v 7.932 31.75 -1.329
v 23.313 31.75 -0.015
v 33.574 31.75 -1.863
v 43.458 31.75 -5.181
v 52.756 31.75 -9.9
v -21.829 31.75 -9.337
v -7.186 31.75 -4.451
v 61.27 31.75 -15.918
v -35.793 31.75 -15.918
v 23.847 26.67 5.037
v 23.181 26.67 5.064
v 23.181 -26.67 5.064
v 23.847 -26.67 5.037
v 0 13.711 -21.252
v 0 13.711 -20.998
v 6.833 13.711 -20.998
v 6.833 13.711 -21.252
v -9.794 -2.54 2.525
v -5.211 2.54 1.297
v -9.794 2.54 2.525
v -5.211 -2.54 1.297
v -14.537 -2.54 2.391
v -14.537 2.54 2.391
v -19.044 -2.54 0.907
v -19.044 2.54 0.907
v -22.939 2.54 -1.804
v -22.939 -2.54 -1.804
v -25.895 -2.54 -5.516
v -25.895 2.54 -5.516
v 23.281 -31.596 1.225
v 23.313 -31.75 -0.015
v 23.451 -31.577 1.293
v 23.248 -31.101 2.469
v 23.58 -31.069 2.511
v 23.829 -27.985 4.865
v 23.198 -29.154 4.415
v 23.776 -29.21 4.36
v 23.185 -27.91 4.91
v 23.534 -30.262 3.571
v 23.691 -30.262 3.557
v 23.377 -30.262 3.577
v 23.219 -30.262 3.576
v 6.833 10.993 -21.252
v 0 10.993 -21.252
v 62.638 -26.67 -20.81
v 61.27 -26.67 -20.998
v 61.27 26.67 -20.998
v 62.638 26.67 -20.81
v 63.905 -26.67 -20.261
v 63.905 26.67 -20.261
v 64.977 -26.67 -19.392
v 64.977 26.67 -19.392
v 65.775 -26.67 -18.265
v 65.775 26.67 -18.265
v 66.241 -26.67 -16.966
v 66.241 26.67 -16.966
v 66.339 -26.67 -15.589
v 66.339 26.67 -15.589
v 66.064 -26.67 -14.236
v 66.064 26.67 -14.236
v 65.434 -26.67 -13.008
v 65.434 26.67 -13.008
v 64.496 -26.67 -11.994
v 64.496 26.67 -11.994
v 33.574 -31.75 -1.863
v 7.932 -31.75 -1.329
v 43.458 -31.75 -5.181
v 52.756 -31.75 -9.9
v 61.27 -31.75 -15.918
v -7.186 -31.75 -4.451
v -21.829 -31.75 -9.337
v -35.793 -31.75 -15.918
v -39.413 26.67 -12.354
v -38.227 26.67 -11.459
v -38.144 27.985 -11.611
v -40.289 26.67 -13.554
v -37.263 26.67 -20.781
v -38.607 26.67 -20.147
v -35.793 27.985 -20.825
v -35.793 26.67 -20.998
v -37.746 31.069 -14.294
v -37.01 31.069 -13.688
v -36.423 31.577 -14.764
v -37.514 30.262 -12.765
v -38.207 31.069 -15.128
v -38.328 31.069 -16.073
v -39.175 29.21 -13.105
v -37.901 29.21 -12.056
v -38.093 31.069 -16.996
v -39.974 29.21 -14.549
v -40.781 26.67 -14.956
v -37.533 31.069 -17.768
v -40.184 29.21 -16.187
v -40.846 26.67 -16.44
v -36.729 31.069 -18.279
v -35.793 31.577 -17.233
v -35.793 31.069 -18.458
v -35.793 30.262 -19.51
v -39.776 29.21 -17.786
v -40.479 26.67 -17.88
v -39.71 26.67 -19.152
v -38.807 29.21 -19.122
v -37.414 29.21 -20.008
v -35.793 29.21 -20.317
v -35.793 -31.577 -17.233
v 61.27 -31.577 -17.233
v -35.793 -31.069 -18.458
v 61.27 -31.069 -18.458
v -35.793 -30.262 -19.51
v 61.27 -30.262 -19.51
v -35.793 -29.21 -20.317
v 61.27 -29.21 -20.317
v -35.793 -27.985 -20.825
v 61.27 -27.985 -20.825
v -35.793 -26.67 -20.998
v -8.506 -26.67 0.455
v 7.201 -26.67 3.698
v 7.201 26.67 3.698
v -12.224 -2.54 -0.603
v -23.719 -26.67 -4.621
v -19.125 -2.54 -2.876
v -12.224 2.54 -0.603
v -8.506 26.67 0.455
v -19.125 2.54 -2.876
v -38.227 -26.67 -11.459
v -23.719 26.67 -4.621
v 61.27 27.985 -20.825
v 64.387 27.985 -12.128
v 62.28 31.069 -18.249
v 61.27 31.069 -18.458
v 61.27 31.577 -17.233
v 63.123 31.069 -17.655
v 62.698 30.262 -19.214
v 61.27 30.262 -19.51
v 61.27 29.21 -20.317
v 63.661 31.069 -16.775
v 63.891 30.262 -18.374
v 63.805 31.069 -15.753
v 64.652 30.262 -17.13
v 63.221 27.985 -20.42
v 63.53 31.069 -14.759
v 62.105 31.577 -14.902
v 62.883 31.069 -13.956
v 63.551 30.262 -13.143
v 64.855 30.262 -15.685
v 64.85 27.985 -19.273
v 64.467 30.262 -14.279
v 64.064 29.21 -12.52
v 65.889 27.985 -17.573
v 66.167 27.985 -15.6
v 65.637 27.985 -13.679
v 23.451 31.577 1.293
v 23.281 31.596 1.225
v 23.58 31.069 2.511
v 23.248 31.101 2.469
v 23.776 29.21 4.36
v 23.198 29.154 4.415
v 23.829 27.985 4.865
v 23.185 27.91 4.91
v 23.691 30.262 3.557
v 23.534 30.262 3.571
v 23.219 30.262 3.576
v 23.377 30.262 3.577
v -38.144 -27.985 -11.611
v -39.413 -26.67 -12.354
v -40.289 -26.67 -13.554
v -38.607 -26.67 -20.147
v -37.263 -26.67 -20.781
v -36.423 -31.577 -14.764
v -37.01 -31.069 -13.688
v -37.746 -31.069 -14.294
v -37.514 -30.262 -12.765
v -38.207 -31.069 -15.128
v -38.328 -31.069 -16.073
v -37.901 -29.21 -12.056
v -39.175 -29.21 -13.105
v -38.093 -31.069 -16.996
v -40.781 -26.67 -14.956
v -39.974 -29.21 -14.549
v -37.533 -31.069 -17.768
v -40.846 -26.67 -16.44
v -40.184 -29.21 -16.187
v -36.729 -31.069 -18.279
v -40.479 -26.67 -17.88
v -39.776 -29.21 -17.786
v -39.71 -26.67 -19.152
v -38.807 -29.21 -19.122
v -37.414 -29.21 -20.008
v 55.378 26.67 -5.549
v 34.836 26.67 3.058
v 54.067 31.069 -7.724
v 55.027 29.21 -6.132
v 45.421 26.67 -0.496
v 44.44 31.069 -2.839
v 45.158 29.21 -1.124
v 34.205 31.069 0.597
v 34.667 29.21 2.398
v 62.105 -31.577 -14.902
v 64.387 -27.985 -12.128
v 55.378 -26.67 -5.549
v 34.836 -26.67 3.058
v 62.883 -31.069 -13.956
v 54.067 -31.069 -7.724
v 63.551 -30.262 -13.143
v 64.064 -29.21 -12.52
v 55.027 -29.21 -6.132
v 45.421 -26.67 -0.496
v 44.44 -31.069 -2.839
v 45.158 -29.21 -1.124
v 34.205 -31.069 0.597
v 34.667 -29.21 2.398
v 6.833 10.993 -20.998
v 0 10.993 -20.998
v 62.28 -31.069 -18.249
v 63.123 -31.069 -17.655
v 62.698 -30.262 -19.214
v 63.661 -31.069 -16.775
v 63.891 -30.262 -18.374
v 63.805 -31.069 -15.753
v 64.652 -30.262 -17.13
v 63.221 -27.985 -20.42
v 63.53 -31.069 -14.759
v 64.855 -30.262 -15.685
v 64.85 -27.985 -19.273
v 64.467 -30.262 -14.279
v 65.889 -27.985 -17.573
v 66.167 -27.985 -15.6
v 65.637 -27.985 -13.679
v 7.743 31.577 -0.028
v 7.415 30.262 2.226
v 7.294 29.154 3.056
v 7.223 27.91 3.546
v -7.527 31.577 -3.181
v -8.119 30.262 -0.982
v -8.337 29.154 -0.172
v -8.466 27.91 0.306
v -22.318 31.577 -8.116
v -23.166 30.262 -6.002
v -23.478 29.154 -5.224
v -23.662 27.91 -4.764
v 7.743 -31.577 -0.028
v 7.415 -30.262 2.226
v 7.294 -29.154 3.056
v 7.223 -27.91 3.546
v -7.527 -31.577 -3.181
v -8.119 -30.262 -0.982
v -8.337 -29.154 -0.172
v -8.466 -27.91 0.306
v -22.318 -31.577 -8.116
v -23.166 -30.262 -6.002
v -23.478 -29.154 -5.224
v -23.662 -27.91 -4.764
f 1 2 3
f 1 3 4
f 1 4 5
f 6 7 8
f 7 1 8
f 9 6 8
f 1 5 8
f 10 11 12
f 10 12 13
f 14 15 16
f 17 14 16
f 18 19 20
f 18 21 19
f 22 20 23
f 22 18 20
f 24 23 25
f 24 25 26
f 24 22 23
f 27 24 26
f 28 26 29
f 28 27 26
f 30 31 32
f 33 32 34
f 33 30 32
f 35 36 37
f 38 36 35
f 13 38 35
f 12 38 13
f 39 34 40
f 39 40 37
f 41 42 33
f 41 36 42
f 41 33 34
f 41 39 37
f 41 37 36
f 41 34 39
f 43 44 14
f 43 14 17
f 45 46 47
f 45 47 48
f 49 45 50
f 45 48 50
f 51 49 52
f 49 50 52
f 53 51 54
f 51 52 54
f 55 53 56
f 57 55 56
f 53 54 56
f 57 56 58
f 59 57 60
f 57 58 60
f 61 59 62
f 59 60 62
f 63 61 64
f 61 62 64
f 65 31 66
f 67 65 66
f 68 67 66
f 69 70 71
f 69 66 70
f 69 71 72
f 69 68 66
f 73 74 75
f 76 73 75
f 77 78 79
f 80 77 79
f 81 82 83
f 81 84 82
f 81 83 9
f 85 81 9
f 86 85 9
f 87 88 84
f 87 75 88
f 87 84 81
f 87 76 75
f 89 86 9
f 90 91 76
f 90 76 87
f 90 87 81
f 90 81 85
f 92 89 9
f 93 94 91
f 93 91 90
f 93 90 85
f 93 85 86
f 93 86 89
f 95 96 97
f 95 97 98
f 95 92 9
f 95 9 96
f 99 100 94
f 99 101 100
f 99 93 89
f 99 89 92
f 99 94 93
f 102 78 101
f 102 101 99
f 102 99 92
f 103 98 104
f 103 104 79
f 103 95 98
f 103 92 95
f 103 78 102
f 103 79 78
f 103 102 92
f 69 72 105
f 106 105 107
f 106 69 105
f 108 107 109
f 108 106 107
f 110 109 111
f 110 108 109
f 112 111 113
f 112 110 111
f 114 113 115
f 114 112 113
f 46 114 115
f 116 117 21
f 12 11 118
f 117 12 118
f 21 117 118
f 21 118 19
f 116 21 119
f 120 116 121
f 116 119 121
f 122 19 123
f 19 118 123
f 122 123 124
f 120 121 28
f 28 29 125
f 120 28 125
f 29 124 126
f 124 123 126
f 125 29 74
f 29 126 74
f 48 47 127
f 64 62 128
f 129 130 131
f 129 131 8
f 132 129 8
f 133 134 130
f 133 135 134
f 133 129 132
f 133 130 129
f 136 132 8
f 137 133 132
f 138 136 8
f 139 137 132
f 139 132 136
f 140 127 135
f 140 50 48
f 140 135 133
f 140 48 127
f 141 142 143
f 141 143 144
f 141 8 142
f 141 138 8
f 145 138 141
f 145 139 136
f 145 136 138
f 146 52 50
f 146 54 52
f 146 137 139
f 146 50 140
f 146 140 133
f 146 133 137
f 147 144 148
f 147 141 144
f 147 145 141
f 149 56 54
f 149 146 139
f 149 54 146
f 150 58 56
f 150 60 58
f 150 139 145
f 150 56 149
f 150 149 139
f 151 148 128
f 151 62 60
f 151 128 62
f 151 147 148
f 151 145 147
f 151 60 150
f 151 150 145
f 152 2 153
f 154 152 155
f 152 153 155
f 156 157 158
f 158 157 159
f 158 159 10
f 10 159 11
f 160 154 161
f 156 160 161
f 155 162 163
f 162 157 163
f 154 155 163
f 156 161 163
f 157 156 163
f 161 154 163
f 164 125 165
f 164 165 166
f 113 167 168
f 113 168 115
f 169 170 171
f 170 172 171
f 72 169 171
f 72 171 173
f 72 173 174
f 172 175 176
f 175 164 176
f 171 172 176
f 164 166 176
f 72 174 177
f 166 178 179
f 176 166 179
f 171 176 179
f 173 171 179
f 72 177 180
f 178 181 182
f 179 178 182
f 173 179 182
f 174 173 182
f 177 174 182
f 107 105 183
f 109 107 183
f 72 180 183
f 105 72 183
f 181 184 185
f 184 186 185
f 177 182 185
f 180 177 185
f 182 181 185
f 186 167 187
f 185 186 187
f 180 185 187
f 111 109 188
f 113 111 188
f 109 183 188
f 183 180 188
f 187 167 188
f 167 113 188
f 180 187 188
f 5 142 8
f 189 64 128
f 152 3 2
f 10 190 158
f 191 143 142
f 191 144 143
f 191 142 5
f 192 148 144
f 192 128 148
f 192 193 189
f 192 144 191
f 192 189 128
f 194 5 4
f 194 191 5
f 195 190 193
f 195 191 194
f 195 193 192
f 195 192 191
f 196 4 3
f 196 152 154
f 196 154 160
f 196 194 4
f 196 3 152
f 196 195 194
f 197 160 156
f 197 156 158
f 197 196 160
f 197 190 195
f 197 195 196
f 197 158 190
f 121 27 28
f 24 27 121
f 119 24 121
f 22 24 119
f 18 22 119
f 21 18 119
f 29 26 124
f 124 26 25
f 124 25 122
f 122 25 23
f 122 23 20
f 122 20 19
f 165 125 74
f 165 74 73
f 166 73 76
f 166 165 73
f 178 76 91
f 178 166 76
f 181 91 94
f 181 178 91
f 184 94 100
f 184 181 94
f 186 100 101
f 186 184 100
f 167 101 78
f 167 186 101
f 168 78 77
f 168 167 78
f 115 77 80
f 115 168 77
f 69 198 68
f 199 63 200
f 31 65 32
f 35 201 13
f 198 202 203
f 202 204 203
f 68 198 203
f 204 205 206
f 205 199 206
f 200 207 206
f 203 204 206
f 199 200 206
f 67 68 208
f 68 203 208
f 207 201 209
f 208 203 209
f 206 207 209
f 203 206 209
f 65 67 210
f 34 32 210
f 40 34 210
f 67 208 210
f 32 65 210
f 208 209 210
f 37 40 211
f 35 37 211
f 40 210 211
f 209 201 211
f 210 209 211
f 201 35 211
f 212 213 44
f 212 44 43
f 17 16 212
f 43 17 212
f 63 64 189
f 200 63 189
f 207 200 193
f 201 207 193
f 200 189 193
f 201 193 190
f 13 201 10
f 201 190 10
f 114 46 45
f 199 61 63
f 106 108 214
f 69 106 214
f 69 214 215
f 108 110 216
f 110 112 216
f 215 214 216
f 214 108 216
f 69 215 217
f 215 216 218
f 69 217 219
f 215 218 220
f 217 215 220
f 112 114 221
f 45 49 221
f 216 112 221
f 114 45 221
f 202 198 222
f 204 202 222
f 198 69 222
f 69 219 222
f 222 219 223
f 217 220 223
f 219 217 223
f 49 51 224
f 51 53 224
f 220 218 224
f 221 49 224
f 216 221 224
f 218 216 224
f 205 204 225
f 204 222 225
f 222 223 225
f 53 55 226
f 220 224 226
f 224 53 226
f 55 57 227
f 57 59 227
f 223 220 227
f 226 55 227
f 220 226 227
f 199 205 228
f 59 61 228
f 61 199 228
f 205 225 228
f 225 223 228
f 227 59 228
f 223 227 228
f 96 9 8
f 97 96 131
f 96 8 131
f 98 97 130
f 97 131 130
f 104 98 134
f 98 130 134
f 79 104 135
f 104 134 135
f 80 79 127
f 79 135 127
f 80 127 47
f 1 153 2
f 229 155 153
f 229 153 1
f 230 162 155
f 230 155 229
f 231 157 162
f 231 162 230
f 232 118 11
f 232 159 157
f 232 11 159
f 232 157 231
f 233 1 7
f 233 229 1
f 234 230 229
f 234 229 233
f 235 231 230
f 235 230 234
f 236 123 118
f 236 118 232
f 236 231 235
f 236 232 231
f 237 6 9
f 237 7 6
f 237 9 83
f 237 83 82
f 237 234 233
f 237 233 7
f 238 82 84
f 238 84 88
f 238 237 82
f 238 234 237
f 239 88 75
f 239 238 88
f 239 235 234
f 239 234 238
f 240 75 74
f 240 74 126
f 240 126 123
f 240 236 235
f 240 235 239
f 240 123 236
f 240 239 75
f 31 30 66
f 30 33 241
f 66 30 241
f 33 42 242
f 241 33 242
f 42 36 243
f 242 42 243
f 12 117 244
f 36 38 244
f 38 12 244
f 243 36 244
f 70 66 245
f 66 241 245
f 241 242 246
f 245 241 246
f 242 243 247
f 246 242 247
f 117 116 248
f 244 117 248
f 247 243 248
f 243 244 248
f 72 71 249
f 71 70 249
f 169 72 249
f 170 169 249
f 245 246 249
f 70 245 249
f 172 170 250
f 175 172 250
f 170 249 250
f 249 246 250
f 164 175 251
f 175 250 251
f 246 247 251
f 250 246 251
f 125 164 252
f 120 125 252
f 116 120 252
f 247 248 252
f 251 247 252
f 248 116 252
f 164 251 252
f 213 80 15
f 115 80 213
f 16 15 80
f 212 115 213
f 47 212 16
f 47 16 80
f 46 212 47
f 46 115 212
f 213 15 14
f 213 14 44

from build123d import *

# Parameters (mm, degrees)
F1_DEPTH      = 31.75
F1_DEPTH_BACK = 31.75
F2_DEPTH      = 2.54
F2_DEPTH_BACK = 2.54
F3_F1_R       = 5.08
F3_F2_R       = 5.08
F3_F3_R       = 5.08
F3_F4_R       = 5.0799
F3_F5_R       = 5.0799
F5_W          = 6.8330275826
F5_H          = 2.7183471248
F6_DEPTH      = 0.254


# Not quite as in the source:
# - a fillet or chamfer is up to 0.001 mm smaller than in the source, because OpenCascade refuses the exact size


with BuildPart() as f1:
    # F0 (on Front) → F1 (new body, two sides)
    with BuildSketch(Plane.XZ) as f1_sk:
        with BuildLine():
            ThreePointArc((-25.8951373398, -5.5155940354), (-40.0289198751, -12.4604967705), (-53.2617530078, -20.9979208572))
            Line((-53.2617530078, -20.9979208572), (73.7382469922, -20.9979208572))
            ThreePointArc((73.7382469922, -20.9979208572), (51.1172189887, -3.1620431242), (23.5122566854, 5.0717590762))
            ThreePointArc((23.5122566854, 5.0717590762), (9.0495911456, 3.953982117), (-5.2107890931, 1.2969771686))
            ThreePointArc((-5.2107890931, 1.2969771686), (-15.6900093901, -1.6932084475), (-25.8951373398, -5.5155940354))
        make_face()
    extrude(amount=F1_DEPTH)
    extrude(f1_sk.sketch, amount=-F1_DEPTH_BACK)

    # F0 (on Front) → F2 (join, two sides)
    with BuildSketch(Plane.XZ) as f2_sk:
        with BuildLine():
            ThreePointArc((-5.2107890931, 1.2969771686), (-16.8447265846, 1.8127472133), (-25.8951373398, -5.5155940354))
            ThreePointArc((-25.8951373398, -5.5155940354), (-15.6900093901, -1.6932084475), (-5.2107890931, 1.2969771686))
        make_face()
    extrude(amount=F2_DEPTH)
    extrude(f2_sk.sketch, amount=-F2_DEPTH_BACK)

    # F3: fillet of radius 5.08 on 9 edges, made by hand

    # F3_f1
    f3_f1_edges = [f1.edges().sort_by_distance(p)[0] for p in [
        (73.7382469922, 0, -20.9979208572),
    ]]
    fillet(f3_f1_edges, radius=F3_F1_R)

    # F3_f2
    f3_f2_edges = [f1.edges().sort_by_distance(p)[0] for p in [
        (23.5122566854, 0, 5.0717590762),
    ]]
    fillet(f3_f2_edges, radius=F3_F2_R)

    # F3_f3
    f3_f3_edges = [f1.edges().sort_by_distance(p)[0] for p in [
        (-53.2617530078, 0, -20.9979208572),
    ]]
    fillet(f3_f3_edges, radius=F3_F3_R)

    # F3_f4 (radius 5.08 in the source; OpenCascade refuses exactly that, so slightly less here)
    f3_f4_edges = [f1.edges().sort_by_distance(p)[0] for p in [
        (-8.5056935283, 31.75, 0.4546248012),
    ]]
    fillet(f3_f4_edges, radius=F3_F4_R)

    # F3_f5 (radius 5.08 in the source; OpenCascade refuses exactly that, so slightly less here)
    f3_f5_edges = [f1.edges().sort_by_distance(p)[0] for p in [
        (-8.5056935283, -31.75, 0.4546248012),
    ]]
    fillet(f3_f5_edges, radius=F3_F5_R)

    # F5 (on face) → F6 (join)
    with BuildSketch(Plane(origin=(0, 0, -20.9979208572), x_dir=(1, 0, 0), z_dir=(0, 0, -1))):
        with Locations((3.4165137913, -12.3521317728)):
            Rectangle(F5_W, F5_H)
    extrude(amount=F6_DEPTH)


solid = f1.part
